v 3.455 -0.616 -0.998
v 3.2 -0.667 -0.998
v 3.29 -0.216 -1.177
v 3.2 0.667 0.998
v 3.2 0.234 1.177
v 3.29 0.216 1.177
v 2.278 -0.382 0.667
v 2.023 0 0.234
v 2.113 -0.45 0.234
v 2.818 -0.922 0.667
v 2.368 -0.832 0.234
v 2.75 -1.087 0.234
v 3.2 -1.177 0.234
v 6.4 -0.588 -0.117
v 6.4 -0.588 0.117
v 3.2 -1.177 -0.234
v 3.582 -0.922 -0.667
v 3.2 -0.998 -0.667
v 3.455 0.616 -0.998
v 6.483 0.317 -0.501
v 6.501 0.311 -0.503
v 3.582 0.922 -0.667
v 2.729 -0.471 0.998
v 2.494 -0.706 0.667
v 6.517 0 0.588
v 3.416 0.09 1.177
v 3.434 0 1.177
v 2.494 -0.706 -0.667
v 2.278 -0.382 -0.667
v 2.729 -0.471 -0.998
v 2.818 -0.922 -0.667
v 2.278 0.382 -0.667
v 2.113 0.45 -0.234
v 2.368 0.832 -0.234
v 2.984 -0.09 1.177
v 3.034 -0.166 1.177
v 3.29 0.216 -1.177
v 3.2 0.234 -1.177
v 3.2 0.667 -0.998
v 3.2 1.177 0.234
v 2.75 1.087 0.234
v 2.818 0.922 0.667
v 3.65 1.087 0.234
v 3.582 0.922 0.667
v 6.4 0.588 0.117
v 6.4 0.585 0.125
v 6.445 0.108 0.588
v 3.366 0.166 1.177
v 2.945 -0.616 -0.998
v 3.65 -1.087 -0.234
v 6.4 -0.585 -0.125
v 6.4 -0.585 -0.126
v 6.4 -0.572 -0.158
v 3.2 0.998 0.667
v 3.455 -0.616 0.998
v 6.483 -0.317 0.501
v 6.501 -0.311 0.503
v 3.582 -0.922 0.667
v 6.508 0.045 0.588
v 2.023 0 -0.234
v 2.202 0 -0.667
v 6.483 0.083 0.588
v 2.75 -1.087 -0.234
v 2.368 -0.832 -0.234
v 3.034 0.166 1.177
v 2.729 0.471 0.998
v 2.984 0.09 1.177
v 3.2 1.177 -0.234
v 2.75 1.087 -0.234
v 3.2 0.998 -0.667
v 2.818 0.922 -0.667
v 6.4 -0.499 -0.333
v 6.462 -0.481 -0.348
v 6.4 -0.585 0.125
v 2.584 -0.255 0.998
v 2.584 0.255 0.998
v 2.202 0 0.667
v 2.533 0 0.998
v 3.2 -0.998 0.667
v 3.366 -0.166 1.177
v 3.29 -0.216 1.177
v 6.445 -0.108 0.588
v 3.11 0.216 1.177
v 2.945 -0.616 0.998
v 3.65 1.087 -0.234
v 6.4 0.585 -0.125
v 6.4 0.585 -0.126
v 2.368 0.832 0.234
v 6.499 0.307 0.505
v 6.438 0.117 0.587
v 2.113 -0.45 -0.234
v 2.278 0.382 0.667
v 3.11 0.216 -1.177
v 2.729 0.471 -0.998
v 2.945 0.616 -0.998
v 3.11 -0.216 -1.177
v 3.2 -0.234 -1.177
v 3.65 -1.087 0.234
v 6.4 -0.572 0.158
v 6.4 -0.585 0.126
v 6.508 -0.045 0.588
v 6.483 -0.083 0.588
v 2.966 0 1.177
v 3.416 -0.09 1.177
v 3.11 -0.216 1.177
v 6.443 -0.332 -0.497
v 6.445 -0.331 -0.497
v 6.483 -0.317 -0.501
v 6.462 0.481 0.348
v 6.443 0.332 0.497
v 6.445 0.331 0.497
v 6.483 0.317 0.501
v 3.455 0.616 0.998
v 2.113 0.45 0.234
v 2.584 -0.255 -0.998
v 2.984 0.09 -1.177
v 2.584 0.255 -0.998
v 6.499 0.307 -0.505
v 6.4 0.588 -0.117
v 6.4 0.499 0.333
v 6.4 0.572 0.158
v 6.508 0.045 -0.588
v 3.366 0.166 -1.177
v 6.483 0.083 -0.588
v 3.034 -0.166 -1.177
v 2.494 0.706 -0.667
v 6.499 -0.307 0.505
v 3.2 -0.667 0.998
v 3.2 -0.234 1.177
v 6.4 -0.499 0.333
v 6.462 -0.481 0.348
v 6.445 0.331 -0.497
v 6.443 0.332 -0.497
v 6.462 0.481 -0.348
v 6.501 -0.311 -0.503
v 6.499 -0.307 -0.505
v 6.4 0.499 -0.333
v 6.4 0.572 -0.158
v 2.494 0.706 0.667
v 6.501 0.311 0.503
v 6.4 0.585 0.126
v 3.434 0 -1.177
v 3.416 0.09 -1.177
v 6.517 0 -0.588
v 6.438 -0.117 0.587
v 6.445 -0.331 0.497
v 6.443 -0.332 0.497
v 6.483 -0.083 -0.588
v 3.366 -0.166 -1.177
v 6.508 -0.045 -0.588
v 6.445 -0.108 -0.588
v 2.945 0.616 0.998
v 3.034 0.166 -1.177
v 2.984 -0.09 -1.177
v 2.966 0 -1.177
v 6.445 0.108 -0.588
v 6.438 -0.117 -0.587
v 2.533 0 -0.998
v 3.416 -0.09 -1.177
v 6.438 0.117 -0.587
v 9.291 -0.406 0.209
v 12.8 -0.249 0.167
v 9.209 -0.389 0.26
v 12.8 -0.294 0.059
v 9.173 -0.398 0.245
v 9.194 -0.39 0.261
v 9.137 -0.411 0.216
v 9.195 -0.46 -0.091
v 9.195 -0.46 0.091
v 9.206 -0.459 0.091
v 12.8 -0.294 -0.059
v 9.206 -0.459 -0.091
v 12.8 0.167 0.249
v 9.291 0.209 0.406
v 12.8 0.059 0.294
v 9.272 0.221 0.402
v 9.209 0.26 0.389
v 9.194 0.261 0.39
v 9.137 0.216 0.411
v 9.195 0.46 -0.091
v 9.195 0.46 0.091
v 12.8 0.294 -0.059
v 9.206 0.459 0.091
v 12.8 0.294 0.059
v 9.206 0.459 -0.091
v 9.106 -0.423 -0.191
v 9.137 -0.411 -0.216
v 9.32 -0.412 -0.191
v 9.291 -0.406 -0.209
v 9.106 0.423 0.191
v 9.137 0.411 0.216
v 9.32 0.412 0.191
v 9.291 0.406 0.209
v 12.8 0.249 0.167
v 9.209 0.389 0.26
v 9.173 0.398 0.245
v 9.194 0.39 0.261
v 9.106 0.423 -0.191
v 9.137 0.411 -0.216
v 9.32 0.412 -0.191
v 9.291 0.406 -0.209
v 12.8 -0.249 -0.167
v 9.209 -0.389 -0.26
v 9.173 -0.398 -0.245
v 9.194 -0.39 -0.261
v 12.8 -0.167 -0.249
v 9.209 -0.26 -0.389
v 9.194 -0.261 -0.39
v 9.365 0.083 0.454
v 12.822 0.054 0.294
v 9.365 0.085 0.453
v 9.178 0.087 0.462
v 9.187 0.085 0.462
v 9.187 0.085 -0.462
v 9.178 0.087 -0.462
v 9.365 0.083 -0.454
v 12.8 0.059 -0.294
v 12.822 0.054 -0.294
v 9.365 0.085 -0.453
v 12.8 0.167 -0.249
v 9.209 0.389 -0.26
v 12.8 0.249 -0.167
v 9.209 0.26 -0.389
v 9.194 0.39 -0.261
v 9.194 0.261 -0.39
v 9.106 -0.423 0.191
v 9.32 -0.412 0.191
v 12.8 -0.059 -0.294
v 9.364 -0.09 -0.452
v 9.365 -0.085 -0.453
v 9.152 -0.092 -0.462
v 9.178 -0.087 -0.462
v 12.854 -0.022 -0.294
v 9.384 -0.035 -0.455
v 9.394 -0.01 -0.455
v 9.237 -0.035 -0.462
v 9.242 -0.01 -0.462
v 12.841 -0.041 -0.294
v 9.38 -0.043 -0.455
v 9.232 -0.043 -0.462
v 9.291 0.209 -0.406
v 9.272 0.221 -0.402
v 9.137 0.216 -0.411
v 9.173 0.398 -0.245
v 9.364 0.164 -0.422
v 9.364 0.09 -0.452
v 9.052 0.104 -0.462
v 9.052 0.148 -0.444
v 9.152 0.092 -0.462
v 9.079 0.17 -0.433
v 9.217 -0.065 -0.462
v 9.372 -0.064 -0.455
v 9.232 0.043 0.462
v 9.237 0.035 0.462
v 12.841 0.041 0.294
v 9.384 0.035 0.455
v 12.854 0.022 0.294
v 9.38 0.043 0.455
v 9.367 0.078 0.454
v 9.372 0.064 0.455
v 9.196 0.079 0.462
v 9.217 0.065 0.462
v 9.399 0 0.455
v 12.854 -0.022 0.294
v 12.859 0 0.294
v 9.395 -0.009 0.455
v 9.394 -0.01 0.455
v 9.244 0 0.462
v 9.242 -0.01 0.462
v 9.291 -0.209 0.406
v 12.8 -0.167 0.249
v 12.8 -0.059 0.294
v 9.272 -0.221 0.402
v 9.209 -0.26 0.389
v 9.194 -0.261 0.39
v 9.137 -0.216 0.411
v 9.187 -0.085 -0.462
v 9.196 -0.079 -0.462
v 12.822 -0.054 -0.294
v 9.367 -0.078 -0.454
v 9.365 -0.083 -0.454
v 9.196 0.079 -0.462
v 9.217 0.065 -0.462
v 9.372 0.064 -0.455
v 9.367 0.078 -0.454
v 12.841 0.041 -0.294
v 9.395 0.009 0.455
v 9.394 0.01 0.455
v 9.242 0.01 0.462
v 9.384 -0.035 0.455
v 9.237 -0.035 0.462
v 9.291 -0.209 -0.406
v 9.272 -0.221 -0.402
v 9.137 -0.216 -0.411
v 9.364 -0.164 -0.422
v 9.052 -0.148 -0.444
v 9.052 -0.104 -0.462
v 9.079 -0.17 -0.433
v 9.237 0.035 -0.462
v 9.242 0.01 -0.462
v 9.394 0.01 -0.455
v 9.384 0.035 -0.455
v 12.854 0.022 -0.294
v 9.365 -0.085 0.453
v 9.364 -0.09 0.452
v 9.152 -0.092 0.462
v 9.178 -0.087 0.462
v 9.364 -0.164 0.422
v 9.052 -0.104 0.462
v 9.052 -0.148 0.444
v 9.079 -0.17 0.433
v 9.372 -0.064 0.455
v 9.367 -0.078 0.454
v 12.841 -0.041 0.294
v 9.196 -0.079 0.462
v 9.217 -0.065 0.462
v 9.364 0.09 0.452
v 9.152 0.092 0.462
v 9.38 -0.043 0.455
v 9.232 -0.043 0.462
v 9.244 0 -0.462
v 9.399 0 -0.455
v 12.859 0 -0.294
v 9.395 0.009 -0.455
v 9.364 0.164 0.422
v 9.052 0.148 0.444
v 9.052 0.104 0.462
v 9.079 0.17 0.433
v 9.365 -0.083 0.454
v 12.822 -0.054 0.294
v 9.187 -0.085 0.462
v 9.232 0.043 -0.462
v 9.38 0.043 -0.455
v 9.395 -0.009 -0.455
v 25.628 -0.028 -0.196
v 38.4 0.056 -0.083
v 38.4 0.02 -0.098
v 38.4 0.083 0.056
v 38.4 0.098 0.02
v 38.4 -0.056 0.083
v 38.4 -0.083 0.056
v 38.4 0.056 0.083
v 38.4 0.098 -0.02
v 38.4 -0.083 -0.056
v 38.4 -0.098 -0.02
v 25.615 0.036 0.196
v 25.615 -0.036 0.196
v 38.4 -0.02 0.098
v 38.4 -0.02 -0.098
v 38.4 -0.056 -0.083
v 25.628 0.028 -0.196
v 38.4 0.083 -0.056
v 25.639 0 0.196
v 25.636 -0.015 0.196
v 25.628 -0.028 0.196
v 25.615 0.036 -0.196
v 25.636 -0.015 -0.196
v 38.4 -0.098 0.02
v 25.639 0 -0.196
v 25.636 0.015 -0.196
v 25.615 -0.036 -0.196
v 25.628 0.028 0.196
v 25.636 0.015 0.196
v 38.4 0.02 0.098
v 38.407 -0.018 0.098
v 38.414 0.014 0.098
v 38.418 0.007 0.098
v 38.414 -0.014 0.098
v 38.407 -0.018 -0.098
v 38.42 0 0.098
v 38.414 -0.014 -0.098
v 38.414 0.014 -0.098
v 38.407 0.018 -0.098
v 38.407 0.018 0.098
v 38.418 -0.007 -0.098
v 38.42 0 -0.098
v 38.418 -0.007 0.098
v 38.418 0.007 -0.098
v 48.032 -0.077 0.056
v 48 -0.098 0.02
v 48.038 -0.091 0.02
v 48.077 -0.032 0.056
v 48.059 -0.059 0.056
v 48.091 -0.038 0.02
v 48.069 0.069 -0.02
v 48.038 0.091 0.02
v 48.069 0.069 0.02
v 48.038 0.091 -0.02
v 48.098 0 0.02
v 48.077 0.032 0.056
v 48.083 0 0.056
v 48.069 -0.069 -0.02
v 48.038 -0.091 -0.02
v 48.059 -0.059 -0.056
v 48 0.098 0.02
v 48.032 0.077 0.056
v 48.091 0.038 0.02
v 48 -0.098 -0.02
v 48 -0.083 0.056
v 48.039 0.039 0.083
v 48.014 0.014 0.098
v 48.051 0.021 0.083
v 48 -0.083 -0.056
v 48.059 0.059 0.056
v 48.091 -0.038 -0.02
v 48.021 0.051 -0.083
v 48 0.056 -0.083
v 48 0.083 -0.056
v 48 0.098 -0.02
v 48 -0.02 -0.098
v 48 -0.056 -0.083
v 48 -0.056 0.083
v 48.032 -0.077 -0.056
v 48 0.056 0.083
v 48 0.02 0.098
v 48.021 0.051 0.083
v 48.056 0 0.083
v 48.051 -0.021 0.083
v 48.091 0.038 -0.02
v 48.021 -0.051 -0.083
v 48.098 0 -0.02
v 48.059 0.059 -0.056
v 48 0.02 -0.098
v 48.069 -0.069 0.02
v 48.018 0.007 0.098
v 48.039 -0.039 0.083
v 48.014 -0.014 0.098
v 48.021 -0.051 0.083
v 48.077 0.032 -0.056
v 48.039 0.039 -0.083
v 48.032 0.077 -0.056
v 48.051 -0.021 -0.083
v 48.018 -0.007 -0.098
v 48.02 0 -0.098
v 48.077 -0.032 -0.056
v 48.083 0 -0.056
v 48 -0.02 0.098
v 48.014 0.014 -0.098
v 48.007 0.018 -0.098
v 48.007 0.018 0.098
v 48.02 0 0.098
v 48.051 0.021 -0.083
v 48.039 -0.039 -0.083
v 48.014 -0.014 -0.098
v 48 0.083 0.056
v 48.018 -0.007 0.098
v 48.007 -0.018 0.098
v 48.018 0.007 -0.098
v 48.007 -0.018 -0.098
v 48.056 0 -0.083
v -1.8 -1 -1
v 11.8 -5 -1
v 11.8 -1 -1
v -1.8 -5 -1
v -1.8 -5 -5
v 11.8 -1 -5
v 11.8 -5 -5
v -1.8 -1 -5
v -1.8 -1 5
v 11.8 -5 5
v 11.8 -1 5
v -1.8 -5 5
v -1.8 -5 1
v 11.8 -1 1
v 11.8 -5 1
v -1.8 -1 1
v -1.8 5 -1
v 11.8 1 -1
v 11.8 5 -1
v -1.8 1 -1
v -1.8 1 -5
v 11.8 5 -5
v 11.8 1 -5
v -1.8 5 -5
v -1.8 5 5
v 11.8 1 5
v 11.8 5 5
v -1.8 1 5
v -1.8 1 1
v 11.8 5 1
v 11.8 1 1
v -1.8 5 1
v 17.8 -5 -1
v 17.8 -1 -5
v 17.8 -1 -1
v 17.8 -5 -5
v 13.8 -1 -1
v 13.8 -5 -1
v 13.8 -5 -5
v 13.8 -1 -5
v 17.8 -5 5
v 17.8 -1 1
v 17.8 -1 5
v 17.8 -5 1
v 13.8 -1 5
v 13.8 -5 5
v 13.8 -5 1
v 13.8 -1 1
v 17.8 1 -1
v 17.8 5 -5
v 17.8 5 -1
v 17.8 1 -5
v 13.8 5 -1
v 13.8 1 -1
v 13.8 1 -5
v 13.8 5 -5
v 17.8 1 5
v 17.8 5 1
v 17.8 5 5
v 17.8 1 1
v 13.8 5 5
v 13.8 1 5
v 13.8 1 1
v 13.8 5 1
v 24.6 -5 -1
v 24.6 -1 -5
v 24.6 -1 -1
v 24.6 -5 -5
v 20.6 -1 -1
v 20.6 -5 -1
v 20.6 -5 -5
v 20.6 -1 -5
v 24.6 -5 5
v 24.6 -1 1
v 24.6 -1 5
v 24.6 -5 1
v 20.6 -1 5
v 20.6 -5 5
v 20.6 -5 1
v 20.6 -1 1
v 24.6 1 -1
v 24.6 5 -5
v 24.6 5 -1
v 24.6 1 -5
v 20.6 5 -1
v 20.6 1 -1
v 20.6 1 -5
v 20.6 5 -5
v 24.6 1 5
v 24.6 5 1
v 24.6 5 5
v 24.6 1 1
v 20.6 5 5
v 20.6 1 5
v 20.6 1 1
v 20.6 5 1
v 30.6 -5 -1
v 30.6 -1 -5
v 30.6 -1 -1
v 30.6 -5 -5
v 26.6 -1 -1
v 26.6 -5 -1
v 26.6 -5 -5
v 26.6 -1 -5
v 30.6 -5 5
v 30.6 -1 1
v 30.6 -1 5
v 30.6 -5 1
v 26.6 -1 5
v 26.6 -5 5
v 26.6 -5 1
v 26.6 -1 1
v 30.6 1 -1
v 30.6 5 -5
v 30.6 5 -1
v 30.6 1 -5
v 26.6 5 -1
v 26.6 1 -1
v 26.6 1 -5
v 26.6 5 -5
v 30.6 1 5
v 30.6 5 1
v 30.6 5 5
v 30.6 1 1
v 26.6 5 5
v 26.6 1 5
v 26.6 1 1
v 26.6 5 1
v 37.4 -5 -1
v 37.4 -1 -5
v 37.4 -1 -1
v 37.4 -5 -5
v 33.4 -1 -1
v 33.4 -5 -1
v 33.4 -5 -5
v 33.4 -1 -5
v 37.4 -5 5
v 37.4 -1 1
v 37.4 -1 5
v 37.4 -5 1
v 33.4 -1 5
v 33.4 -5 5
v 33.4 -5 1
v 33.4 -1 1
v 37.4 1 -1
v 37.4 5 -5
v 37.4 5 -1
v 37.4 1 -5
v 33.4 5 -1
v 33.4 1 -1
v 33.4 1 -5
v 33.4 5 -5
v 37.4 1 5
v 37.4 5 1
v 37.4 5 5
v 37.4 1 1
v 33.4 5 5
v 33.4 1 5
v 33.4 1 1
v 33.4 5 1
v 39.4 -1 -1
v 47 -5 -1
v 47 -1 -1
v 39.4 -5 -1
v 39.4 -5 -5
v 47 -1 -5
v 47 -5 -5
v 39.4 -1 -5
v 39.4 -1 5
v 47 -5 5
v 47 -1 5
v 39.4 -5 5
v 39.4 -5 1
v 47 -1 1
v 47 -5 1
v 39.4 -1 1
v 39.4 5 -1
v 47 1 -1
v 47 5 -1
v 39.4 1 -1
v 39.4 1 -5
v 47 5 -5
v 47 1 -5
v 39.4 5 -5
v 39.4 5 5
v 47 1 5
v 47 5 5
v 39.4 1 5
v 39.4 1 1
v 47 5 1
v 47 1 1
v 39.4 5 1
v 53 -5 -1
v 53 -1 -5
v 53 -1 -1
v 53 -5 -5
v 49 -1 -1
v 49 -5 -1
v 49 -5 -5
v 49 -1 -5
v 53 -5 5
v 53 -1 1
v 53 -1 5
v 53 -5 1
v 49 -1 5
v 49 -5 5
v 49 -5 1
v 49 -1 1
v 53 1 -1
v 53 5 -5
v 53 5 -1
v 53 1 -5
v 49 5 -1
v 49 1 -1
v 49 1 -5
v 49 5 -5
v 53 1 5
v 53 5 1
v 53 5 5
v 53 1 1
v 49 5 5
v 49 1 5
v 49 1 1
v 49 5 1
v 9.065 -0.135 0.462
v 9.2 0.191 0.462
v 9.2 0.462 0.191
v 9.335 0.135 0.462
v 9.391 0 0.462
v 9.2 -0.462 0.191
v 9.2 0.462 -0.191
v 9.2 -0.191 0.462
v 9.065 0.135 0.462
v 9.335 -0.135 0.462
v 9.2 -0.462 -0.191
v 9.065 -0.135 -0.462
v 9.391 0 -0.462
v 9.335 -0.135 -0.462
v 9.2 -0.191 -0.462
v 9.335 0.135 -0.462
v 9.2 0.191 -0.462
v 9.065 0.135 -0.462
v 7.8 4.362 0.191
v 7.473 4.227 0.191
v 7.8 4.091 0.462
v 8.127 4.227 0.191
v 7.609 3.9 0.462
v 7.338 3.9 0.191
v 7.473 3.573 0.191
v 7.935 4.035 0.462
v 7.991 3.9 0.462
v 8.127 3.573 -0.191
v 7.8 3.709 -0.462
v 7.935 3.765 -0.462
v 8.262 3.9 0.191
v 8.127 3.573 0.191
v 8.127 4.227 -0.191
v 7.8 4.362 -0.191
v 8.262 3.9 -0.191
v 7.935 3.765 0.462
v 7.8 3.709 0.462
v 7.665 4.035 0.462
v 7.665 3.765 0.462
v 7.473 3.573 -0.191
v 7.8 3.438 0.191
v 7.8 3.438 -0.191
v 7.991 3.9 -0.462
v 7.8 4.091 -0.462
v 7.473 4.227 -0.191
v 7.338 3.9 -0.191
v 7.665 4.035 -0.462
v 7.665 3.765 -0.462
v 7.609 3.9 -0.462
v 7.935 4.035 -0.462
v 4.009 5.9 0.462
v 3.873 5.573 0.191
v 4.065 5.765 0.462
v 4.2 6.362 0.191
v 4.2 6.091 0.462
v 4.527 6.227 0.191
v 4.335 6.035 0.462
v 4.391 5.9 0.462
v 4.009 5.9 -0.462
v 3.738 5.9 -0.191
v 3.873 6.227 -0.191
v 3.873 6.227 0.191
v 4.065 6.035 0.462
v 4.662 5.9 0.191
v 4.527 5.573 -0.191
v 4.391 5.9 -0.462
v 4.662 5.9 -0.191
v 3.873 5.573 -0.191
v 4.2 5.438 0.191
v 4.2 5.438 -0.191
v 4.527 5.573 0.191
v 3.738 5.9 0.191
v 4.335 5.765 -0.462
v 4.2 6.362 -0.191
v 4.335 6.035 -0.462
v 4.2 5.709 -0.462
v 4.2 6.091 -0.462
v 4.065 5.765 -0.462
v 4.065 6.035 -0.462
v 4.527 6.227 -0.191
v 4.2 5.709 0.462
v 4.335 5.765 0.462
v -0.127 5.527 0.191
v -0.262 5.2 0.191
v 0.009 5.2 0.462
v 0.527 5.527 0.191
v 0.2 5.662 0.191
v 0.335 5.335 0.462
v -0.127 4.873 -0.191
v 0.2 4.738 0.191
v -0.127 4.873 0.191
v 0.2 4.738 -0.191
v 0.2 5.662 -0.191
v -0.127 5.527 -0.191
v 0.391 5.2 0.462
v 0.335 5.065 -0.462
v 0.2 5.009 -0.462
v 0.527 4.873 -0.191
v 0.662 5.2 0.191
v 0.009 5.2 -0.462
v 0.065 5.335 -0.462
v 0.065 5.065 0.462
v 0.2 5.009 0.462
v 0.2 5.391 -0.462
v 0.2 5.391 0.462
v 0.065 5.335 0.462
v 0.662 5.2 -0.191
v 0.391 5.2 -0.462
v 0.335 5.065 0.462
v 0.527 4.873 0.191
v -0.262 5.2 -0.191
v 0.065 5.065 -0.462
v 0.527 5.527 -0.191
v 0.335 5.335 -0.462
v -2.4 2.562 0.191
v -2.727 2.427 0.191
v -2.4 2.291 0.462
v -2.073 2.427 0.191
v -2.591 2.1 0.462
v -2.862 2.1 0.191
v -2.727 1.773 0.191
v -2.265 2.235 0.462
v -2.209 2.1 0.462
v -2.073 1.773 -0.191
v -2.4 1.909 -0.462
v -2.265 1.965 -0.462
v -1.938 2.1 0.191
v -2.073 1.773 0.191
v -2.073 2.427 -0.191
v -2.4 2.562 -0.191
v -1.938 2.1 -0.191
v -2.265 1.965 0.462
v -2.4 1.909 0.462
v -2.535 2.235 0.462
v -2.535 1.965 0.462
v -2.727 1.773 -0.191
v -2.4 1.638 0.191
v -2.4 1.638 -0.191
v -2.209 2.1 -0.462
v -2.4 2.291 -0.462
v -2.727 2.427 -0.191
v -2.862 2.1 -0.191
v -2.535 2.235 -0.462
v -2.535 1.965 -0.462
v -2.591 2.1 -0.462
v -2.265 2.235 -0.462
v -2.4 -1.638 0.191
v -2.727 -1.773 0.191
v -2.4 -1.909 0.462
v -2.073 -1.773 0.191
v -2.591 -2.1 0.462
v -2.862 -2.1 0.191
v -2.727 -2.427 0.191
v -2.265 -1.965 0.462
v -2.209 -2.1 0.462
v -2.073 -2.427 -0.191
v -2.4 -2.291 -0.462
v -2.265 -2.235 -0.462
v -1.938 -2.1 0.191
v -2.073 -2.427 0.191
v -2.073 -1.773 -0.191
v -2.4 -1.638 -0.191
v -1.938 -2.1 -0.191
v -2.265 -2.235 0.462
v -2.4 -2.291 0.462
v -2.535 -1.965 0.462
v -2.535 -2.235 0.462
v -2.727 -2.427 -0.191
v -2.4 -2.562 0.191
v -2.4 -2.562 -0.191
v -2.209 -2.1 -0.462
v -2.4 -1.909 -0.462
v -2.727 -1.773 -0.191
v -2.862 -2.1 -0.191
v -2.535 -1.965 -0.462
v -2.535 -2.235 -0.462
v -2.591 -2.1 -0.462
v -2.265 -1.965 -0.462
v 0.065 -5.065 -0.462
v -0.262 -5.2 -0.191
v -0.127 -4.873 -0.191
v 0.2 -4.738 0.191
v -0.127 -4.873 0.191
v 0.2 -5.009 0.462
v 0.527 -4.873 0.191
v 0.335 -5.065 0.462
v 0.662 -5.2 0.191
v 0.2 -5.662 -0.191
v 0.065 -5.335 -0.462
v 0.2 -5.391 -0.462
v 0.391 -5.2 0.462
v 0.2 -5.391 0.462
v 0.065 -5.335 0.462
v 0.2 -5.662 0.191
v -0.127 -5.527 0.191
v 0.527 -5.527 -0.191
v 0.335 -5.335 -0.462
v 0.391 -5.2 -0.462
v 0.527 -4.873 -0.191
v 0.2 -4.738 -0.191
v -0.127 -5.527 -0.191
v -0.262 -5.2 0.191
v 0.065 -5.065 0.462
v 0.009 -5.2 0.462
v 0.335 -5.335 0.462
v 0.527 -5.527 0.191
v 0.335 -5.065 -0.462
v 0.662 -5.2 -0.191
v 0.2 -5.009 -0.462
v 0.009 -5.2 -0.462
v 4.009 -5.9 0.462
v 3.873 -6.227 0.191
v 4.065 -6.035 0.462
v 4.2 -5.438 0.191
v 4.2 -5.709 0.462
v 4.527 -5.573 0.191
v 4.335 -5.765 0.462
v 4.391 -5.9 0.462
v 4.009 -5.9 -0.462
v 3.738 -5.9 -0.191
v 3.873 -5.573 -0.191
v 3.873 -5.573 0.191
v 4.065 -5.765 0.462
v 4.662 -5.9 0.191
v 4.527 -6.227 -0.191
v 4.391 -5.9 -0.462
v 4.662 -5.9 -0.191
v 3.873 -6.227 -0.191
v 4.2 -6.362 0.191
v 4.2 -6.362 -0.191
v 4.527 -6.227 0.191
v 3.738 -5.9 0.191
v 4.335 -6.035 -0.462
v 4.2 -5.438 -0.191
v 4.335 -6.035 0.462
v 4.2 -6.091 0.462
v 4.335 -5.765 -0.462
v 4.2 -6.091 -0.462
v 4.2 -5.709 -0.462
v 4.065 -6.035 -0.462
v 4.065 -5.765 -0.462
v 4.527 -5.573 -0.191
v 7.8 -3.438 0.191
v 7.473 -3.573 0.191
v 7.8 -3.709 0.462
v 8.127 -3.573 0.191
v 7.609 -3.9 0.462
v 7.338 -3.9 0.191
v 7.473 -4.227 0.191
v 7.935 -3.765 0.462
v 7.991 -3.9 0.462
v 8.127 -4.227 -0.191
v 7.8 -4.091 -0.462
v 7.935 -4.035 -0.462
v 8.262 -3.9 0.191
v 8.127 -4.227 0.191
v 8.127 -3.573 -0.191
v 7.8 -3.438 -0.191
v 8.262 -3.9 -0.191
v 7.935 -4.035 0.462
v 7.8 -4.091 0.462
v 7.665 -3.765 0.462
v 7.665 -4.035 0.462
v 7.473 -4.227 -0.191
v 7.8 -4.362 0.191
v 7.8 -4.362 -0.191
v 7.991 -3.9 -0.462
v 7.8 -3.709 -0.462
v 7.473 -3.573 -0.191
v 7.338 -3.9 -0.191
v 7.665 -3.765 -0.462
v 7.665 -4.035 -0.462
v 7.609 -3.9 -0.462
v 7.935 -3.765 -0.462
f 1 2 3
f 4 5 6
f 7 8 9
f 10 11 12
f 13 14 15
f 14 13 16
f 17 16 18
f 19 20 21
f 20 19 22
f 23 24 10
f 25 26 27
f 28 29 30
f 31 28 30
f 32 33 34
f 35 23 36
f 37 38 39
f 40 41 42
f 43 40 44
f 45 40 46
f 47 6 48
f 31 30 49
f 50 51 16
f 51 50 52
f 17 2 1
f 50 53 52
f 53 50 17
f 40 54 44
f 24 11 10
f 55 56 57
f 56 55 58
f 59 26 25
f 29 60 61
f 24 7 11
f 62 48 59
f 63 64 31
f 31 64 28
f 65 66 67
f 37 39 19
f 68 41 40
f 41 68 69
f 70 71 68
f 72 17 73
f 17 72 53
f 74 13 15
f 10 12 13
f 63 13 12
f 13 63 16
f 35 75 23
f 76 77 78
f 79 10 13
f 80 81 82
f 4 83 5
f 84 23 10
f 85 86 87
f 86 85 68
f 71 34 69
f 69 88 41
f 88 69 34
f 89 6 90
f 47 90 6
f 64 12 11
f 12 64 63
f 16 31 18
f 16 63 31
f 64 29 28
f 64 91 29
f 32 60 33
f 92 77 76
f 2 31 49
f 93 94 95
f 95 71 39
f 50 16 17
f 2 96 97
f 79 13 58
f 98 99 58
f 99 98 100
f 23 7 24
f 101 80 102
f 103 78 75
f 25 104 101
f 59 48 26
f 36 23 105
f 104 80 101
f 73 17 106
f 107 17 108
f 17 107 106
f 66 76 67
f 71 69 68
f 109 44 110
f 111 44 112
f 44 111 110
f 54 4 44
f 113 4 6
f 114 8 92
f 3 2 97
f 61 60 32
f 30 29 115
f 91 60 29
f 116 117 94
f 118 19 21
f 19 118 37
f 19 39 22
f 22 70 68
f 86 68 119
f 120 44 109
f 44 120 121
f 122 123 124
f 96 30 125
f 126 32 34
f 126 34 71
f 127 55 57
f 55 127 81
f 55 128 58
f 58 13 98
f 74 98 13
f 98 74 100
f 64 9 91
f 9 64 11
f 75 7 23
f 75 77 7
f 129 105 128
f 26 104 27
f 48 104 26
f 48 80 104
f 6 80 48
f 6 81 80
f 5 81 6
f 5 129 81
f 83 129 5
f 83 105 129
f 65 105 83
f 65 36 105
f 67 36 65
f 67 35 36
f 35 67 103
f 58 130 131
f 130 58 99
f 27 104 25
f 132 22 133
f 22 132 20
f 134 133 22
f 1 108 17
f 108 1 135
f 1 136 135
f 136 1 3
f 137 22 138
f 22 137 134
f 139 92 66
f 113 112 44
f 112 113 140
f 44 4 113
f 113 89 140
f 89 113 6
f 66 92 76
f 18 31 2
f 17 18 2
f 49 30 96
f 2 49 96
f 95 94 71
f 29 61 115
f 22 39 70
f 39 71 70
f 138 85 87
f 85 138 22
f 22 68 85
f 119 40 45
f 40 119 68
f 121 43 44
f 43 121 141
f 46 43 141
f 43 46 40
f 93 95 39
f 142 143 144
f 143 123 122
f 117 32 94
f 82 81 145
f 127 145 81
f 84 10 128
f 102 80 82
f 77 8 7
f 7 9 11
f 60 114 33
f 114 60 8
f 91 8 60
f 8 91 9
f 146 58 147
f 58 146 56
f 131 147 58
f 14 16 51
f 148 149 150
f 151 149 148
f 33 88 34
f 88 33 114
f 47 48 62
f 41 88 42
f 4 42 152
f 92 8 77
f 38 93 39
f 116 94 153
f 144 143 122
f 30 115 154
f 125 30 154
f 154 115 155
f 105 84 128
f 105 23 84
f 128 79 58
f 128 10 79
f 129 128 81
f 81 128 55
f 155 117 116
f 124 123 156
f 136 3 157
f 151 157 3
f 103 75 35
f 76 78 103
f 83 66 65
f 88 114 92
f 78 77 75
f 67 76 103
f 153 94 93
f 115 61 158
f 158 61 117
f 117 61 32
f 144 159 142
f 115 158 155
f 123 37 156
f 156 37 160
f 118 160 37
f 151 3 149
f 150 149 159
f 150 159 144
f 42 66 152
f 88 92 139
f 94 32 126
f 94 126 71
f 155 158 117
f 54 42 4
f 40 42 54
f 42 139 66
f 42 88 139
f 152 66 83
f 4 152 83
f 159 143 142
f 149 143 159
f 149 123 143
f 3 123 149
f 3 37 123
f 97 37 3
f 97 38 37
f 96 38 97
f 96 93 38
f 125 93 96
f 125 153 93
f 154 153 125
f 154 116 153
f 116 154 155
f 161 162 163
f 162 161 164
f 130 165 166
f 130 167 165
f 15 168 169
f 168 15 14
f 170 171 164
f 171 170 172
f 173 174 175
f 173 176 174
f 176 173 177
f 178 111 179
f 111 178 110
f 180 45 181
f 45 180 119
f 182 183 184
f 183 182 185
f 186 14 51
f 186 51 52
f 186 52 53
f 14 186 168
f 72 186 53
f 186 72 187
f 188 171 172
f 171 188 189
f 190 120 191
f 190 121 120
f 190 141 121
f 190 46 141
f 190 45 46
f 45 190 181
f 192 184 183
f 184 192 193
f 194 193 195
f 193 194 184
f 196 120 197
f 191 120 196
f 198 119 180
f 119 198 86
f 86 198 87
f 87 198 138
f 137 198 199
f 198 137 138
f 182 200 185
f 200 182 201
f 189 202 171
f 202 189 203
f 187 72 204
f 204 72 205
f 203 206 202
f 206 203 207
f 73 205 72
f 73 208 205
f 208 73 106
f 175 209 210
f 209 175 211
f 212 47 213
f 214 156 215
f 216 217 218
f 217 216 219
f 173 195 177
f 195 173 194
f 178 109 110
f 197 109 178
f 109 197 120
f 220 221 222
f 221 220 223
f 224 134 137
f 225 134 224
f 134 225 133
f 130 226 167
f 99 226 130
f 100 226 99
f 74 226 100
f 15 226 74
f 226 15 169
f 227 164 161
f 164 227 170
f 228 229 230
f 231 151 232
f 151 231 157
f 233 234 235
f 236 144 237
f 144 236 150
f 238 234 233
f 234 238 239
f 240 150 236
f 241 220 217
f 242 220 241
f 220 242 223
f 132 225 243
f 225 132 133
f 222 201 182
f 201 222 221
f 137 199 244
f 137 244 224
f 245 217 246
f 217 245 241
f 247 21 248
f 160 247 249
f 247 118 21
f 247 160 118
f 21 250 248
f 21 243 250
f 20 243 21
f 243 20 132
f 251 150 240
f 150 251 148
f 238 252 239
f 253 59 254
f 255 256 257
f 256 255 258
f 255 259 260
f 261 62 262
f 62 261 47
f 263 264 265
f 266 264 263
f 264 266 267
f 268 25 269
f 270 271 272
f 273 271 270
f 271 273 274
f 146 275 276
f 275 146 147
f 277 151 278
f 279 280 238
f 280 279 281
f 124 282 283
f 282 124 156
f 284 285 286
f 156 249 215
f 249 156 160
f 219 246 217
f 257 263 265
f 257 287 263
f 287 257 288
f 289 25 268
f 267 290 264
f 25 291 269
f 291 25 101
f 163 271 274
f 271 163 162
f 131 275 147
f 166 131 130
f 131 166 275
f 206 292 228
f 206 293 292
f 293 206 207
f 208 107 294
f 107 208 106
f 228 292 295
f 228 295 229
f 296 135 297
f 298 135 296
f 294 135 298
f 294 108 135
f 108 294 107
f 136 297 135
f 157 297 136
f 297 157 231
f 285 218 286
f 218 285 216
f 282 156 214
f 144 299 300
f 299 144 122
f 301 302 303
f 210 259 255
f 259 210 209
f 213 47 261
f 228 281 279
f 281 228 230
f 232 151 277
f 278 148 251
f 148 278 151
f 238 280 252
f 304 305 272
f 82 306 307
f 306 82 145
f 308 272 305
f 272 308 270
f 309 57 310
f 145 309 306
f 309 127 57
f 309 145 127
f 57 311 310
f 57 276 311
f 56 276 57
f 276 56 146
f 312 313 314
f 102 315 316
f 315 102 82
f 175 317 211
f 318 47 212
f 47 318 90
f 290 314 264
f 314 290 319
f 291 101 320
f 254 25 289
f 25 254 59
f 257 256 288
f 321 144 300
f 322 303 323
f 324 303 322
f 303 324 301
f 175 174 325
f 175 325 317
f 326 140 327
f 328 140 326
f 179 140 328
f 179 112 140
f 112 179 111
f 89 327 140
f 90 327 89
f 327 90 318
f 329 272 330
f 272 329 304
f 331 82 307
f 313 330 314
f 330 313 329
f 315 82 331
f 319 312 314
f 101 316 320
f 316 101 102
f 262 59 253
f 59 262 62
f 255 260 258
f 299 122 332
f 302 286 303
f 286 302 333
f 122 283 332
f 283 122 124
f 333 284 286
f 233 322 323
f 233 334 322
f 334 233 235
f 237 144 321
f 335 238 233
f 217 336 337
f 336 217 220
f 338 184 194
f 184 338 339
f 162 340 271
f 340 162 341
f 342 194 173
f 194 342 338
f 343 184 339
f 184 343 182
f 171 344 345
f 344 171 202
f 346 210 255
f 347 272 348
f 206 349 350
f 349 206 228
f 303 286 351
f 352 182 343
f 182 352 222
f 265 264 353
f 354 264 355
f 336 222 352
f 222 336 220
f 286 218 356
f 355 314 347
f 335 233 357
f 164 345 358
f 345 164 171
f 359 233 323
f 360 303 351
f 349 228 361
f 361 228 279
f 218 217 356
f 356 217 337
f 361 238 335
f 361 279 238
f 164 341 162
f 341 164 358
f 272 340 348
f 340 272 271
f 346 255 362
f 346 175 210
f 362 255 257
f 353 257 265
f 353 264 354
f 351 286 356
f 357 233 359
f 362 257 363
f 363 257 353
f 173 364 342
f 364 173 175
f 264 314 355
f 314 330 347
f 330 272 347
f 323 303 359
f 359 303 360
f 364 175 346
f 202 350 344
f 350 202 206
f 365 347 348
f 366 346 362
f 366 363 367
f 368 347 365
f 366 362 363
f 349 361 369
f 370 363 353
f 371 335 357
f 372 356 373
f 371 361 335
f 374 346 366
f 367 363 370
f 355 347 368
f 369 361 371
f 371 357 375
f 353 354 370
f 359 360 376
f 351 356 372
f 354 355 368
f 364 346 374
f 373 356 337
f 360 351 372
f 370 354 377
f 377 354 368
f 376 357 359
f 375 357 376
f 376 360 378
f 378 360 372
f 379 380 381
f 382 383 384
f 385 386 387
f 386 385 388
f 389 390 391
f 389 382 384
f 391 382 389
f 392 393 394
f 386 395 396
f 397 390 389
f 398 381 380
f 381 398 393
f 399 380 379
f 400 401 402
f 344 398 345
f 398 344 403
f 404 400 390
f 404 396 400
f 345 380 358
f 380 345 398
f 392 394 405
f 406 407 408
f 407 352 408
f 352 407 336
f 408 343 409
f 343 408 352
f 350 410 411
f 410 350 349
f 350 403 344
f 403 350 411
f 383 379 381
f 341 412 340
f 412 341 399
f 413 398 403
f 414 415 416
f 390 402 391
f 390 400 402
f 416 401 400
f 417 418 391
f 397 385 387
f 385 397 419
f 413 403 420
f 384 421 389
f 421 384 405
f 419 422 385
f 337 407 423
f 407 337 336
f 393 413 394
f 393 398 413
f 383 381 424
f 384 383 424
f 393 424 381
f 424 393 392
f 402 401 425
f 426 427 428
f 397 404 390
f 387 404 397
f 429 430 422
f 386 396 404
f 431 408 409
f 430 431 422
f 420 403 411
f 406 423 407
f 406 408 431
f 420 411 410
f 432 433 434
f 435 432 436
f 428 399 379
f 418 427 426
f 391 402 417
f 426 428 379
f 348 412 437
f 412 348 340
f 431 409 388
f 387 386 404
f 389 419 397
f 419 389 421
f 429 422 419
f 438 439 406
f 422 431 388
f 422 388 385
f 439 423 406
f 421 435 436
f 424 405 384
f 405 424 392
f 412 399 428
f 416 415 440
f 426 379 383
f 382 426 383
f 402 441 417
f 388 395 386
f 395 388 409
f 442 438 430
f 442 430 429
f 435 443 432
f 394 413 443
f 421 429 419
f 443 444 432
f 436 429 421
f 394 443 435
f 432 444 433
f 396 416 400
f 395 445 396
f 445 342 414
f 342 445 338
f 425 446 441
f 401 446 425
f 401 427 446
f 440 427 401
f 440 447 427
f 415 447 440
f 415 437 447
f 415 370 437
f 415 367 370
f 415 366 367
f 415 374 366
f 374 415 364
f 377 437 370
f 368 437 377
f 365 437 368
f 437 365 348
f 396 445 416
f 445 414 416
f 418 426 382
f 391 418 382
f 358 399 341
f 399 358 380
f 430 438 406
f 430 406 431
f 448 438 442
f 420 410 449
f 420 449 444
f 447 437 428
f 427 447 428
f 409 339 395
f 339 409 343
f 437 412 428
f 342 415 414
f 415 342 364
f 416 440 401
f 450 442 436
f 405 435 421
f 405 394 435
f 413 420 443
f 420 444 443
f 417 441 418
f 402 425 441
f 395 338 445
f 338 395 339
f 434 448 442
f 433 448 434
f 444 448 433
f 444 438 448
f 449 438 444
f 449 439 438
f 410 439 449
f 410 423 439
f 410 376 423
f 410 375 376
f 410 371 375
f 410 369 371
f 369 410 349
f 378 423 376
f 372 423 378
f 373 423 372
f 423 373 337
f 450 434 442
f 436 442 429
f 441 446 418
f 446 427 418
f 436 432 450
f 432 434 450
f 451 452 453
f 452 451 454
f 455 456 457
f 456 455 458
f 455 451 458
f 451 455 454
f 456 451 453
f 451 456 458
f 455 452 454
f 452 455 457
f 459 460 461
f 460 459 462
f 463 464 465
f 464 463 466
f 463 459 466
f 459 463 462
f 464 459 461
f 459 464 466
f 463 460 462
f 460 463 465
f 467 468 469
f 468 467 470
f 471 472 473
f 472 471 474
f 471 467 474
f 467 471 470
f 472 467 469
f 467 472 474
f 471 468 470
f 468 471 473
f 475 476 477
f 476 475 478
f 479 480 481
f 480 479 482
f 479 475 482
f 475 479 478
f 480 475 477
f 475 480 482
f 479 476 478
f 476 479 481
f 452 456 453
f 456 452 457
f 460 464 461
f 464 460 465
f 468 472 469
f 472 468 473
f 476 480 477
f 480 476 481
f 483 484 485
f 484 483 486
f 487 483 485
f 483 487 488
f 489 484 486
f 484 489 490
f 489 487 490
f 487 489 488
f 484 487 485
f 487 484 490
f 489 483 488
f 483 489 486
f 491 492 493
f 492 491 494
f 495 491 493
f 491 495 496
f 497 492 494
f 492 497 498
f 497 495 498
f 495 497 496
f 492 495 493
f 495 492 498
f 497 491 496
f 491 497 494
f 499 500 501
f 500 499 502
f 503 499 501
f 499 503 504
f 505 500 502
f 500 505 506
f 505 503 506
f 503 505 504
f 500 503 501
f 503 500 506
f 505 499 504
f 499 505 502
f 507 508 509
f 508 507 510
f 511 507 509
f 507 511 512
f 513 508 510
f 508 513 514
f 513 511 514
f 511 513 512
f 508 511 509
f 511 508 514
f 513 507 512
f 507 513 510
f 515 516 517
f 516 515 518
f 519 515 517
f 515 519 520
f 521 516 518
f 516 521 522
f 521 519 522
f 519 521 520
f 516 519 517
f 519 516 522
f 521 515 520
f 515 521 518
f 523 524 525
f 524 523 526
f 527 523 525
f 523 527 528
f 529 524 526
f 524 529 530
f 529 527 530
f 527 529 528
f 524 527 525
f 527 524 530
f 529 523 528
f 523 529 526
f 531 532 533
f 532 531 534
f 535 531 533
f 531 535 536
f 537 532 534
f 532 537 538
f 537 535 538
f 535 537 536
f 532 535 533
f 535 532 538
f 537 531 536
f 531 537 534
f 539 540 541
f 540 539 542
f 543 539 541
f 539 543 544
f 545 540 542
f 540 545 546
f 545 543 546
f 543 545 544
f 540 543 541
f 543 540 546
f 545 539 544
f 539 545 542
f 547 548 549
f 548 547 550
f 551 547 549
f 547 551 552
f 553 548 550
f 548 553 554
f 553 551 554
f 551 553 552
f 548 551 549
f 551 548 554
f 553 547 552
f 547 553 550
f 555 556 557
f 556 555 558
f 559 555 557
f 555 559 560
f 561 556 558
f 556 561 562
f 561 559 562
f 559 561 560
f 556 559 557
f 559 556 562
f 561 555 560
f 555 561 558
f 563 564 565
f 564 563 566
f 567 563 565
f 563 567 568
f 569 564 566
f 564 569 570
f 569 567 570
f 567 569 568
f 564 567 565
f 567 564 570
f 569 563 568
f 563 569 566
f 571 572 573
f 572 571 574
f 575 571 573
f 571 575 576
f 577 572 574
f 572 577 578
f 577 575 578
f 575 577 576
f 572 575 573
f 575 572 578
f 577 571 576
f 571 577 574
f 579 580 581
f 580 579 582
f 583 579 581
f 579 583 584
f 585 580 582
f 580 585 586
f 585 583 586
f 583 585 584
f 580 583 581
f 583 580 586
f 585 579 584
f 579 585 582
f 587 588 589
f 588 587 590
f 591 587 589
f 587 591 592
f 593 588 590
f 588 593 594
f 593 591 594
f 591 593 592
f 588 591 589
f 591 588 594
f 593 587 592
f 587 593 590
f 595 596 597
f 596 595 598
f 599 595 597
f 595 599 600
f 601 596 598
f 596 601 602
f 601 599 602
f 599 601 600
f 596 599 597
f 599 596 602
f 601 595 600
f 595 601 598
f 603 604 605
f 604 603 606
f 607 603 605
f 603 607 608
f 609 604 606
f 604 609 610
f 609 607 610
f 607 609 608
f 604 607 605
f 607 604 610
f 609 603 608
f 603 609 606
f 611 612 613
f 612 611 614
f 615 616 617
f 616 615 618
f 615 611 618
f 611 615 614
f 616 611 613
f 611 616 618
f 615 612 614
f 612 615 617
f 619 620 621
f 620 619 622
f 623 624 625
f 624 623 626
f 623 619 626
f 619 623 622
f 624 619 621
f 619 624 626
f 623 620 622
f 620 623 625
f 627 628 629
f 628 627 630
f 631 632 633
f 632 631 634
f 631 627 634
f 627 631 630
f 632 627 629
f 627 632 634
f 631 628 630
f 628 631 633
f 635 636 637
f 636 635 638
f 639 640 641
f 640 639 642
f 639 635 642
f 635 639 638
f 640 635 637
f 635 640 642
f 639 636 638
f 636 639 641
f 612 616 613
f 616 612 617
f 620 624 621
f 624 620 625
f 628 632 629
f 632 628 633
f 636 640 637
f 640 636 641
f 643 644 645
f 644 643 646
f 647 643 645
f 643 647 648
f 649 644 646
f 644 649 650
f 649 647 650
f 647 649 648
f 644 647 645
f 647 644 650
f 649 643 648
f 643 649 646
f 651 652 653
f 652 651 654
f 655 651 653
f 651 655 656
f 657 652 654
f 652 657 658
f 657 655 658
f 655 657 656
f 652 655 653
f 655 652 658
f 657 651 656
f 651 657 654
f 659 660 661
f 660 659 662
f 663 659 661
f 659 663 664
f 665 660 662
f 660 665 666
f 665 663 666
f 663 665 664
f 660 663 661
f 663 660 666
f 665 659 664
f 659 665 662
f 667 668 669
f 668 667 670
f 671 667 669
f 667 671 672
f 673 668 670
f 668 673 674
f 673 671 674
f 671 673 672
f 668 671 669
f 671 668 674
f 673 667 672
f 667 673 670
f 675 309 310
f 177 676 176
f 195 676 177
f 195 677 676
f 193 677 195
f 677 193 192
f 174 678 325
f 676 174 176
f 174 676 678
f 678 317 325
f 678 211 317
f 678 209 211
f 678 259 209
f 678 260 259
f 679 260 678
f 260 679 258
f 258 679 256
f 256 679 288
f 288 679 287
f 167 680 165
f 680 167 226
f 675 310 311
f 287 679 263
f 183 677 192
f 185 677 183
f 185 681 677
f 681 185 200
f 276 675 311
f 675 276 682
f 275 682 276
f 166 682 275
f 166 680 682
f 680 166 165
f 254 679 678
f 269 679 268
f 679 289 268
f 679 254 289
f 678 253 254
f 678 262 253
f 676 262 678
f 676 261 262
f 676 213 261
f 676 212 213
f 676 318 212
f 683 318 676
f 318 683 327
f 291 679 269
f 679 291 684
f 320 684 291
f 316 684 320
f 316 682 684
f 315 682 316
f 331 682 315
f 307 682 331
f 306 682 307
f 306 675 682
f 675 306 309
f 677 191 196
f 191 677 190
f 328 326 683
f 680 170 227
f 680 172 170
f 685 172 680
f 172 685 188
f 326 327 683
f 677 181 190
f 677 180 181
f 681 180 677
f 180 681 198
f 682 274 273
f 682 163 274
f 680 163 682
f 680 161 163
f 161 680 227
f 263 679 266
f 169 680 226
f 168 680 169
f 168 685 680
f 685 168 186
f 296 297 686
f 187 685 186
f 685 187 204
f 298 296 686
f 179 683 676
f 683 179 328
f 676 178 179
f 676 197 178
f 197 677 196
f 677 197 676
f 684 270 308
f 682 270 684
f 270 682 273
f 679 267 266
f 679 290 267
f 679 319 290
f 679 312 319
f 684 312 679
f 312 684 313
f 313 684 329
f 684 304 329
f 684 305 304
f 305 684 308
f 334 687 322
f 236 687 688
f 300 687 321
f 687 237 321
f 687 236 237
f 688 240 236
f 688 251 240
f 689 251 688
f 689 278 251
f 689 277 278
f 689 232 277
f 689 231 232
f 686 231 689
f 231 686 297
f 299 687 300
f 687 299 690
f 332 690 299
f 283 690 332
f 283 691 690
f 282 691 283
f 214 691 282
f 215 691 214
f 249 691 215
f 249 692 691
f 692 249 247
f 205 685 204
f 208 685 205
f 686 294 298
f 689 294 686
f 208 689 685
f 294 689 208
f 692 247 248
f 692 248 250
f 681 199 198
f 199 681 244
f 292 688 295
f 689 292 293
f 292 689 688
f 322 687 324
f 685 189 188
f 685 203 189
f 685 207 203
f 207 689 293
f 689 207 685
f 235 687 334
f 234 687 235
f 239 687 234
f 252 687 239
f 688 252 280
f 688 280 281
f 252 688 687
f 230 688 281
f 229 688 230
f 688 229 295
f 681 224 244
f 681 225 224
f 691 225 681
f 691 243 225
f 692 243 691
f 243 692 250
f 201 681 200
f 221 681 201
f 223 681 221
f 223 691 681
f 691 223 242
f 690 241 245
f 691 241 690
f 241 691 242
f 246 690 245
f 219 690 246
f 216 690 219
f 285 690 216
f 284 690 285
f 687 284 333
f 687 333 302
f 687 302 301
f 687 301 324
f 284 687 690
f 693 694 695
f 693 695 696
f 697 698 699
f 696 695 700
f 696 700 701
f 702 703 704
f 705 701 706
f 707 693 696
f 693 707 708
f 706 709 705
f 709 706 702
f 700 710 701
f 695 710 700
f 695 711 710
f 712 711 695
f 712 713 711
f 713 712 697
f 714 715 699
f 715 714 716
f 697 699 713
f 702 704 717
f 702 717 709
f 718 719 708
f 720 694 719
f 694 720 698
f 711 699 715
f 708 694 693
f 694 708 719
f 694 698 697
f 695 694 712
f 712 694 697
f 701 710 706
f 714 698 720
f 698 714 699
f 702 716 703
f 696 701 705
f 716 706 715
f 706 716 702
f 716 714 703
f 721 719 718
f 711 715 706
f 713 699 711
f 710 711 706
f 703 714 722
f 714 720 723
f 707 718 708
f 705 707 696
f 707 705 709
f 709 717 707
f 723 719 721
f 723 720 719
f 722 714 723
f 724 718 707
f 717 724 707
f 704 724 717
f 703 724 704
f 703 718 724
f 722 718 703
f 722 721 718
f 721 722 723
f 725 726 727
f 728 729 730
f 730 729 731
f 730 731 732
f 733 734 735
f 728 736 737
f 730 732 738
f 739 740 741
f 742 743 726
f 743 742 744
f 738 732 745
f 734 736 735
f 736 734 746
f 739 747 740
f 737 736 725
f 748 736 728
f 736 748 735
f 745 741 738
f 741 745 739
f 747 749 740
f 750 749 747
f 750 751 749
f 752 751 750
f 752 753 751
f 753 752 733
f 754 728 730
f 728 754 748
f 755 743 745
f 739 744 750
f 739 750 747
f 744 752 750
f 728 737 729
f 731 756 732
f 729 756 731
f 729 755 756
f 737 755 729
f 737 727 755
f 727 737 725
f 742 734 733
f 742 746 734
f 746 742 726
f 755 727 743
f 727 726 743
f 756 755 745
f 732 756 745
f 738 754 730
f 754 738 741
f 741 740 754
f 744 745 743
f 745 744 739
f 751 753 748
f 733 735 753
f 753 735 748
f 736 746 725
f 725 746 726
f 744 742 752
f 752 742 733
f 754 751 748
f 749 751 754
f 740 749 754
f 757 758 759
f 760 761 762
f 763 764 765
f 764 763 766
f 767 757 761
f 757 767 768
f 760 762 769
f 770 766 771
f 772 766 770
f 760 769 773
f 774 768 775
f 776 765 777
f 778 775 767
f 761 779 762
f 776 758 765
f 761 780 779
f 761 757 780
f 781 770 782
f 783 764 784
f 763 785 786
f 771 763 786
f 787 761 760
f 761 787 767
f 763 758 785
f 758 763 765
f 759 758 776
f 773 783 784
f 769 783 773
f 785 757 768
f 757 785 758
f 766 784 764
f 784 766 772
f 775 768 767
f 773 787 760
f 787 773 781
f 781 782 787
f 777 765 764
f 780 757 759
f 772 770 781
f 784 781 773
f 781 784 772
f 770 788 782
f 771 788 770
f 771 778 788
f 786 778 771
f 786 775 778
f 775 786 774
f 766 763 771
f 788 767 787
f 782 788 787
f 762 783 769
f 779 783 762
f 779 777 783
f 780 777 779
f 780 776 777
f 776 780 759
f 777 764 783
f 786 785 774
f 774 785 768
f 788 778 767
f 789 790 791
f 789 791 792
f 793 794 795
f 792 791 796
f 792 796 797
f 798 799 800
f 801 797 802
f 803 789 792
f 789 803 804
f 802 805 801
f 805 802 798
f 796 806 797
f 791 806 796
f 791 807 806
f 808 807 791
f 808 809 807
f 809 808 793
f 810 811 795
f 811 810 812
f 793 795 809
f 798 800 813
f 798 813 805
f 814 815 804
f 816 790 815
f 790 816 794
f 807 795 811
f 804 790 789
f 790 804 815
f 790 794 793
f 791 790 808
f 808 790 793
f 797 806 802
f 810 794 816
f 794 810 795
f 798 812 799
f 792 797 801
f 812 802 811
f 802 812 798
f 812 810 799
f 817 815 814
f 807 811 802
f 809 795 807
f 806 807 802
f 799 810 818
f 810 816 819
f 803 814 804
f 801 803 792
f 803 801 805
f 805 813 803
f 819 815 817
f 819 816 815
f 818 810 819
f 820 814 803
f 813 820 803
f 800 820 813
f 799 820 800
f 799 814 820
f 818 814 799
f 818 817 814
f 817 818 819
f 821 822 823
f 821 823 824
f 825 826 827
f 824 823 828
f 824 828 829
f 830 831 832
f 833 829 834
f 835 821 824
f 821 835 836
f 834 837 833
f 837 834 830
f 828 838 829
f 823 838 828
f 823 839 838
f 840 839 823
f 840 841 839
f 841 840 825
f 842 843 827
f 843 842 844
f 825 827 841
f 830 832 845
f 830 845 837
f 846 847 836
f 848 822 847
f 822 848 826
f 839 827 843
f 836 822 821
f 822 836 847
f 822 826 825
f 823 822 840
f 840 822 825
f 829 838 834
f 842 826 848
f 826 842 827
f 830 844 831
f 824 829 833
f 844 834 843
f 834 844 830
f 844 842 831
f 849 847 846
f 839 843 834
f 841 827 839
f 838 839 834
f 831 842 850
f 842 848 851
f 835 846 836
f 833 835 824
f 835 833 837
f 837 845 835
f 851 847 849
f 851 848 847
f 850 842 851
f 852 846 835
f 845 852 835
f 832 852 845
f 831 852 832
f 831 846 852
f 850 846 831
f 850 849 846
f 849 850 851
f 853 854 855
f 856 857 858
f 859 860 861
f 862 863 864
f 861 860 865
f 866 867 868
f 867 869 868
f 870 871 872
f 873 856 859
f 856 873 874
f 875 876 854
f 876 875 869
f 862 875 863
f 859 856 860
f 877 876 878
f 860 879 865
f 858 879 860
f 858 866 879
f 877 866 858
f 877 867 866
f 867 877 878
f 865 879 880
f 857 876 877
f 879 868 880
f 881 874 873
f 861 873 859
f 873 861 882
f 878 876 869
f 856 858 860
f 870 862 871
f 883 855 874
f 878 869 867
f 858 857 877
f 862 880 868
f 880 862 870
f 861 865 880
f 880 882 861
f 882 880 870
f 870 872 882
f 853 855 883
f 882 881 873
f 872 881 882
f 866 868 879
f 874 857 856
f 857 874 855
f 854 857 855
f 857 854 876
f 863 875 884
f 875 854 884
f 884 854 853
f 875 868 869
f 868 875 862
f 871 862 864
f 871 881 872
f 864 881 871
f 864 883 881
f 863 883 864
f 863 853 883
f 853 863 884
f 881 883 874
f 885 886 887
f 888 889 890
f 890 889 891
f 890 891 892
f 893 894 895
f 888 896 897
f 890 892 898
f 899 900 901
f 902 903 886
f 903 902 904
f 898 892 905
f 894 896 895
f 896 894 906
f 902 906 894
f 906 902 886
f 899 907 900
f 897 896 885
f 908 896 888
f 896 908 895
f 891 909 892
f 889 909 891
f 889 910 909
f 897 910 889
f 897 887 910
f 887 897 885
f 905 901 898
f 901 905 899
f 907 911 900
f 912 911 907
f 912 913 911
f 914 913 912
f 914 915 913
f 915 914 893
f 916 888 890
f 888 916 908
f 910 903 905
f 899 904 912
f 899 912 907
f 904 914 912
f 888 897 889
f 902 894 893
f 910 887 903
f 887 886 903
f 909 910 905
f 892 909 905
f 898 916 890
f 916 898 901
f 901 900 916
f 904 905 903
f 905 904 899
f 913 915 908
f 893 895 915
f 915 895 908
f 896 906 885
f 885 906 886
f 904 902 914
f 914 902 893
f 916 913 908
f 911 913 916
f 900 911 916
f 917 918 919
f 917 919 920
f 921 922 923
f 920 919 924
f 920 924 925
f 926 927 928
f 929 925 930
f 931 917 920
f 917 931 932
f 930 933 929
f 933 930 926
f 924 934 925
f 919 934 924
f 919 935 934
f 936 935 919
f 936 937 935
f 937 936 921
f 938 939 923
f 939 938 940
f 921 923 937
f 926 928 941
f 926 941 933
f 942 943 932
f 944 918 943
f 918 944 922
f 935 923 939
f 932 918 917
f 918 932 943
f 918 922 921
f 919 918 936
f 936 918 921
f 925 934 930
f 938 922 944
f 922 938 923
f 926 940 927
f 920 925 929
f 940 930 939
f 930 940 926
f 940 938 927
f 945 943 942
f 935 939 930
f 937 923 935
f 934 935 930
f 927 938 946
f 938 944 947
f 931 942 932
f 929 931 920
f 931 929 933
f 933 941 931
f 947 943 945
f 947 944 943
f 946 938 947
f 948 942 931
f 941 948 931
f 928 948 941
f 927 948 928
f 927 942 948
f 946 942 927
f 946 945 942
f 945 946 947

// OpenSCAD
// Composite Pathological Manifold: 3D Slice
// 3D slice of PIST pathological manifold

// NOT the full 9D structure — a visualizable 3D projection
// Shows how PIST shells nest within sponge nodes on the horn

// The composite structure:
// - Gabriel's horn: backbone (x-axis curve)
// - Menger sponge nodes: attached at 8 sample points
// - PIST shells: inside each sponge node

module sponge_node(x_pos, horn_radius) {
  // Small Menger-like cube cluster at this horn position
  translate([x_pos, 0, 0]) {
    translate([-3, -3, -3]) cube([4, 4, 4], center=true); // subcube 0
    translate([-3, -3, 3]) cube([4, 4, 4], center=true); // subcube 1
    translate([-3, 3, -3]) cube([4, 4, 4], center=true); // subcube 2
    translate([-3, 3, 3]) cube([4, 4, 4], center=true); // subcube 3
    translate([3, -3, -3]) cube([4, 4, 4], center=true); // subcube 4
    translate([3, -3, 3]) cube([4, 4, 4], center=true); // subcube 5
    translate([3, 3, -3]) cube([4, 4, 4], center=true); // subcube 6
    translate([3, 3, 3]) cube([4, 4, 4], center=true); // subcube 7
  }
}

// Horn backbone
color([0.2, 0.2, 0.4]) {
  hull() {
    translate([3.2, 0, 0]) sphere(r=1.2, $fn=16);
    translate([6.4, 0, 0]) sphere(r=0.6, $fn=16);
  }
  hull() {
    translate([6.4, 0, 0]) sphere(r=0.6, $fn=16);
    translate([12.8, 0, 0]) sphere(r=0.3, $fn=16);
  }
  hull() {
    translate([12.8, 0, 0]) sphere(r=0.3, $fn=16);
    translate([25.6, 0, 0]) sphere(r=0.2, $fn=16);
  }
  hull() {
    translate([25.6, 0, 0]) sphere(r=0.2, $fn=16);
    translate([38.4, 0, 0]) sphere(r=0.1, $fn=16);
  }
  hull() {
    translate([38.4, 0, 0]) sphere(r=0.1, $fn=16);
    translate([48.0, 0, 0]) sphere(r=0.1, $fn=16);
  }
}

// Sponge nodes at sample positions
color([0.8, 0.4, 0.1]) {
  sponge_node(3.2, 1.2); // n=16
  sponge_node(6.4, 0.6); // n=32
  sponge_node(12.8, 0.3); // n=64
  sponge_node(25.6, 0.2); // n=128
  sponge_node(38.4, 0.1); // n=192
  sponge_node(48.0, 0.1); // n=240
}

// PIST shell inside sponge node 0 (n=16, k=4)
color([0.1, 0.7, 0.3]) translate([3.2, 0, 0]) {
  translate([6.0, 0.0, 0]) sphere(r=0.5, $fn=8); // t=0
  translate([4.6, 3.9, 0]) sphere(r=0.5, $fn=8); // t=1
  translate([1.0, 5.9, 0]) sphere(r=0.5, $fn=8); // t=2
  translate([-3.0, 5.2, 0]) sphere(r=0.5, $fn=8); // t=3
  translate([-5.6, 2.1, 0]) sphere(r=0.5, $fn=8); // t=4
  translate([-5.6, -2.1, 0]) sphere(r=0.5, $fn=8); // t=5
  translate([-3.0, -5.2, 0]) sphere(r=0.5, $fn=8); // t=6
  translate([1.0, -5.9, 0]) sphere(r=0.5, $fn=8); // t=7
  translate([4.6, -3.9, 0]) sphere(r=0.5, $fn=8); // t=8
}
